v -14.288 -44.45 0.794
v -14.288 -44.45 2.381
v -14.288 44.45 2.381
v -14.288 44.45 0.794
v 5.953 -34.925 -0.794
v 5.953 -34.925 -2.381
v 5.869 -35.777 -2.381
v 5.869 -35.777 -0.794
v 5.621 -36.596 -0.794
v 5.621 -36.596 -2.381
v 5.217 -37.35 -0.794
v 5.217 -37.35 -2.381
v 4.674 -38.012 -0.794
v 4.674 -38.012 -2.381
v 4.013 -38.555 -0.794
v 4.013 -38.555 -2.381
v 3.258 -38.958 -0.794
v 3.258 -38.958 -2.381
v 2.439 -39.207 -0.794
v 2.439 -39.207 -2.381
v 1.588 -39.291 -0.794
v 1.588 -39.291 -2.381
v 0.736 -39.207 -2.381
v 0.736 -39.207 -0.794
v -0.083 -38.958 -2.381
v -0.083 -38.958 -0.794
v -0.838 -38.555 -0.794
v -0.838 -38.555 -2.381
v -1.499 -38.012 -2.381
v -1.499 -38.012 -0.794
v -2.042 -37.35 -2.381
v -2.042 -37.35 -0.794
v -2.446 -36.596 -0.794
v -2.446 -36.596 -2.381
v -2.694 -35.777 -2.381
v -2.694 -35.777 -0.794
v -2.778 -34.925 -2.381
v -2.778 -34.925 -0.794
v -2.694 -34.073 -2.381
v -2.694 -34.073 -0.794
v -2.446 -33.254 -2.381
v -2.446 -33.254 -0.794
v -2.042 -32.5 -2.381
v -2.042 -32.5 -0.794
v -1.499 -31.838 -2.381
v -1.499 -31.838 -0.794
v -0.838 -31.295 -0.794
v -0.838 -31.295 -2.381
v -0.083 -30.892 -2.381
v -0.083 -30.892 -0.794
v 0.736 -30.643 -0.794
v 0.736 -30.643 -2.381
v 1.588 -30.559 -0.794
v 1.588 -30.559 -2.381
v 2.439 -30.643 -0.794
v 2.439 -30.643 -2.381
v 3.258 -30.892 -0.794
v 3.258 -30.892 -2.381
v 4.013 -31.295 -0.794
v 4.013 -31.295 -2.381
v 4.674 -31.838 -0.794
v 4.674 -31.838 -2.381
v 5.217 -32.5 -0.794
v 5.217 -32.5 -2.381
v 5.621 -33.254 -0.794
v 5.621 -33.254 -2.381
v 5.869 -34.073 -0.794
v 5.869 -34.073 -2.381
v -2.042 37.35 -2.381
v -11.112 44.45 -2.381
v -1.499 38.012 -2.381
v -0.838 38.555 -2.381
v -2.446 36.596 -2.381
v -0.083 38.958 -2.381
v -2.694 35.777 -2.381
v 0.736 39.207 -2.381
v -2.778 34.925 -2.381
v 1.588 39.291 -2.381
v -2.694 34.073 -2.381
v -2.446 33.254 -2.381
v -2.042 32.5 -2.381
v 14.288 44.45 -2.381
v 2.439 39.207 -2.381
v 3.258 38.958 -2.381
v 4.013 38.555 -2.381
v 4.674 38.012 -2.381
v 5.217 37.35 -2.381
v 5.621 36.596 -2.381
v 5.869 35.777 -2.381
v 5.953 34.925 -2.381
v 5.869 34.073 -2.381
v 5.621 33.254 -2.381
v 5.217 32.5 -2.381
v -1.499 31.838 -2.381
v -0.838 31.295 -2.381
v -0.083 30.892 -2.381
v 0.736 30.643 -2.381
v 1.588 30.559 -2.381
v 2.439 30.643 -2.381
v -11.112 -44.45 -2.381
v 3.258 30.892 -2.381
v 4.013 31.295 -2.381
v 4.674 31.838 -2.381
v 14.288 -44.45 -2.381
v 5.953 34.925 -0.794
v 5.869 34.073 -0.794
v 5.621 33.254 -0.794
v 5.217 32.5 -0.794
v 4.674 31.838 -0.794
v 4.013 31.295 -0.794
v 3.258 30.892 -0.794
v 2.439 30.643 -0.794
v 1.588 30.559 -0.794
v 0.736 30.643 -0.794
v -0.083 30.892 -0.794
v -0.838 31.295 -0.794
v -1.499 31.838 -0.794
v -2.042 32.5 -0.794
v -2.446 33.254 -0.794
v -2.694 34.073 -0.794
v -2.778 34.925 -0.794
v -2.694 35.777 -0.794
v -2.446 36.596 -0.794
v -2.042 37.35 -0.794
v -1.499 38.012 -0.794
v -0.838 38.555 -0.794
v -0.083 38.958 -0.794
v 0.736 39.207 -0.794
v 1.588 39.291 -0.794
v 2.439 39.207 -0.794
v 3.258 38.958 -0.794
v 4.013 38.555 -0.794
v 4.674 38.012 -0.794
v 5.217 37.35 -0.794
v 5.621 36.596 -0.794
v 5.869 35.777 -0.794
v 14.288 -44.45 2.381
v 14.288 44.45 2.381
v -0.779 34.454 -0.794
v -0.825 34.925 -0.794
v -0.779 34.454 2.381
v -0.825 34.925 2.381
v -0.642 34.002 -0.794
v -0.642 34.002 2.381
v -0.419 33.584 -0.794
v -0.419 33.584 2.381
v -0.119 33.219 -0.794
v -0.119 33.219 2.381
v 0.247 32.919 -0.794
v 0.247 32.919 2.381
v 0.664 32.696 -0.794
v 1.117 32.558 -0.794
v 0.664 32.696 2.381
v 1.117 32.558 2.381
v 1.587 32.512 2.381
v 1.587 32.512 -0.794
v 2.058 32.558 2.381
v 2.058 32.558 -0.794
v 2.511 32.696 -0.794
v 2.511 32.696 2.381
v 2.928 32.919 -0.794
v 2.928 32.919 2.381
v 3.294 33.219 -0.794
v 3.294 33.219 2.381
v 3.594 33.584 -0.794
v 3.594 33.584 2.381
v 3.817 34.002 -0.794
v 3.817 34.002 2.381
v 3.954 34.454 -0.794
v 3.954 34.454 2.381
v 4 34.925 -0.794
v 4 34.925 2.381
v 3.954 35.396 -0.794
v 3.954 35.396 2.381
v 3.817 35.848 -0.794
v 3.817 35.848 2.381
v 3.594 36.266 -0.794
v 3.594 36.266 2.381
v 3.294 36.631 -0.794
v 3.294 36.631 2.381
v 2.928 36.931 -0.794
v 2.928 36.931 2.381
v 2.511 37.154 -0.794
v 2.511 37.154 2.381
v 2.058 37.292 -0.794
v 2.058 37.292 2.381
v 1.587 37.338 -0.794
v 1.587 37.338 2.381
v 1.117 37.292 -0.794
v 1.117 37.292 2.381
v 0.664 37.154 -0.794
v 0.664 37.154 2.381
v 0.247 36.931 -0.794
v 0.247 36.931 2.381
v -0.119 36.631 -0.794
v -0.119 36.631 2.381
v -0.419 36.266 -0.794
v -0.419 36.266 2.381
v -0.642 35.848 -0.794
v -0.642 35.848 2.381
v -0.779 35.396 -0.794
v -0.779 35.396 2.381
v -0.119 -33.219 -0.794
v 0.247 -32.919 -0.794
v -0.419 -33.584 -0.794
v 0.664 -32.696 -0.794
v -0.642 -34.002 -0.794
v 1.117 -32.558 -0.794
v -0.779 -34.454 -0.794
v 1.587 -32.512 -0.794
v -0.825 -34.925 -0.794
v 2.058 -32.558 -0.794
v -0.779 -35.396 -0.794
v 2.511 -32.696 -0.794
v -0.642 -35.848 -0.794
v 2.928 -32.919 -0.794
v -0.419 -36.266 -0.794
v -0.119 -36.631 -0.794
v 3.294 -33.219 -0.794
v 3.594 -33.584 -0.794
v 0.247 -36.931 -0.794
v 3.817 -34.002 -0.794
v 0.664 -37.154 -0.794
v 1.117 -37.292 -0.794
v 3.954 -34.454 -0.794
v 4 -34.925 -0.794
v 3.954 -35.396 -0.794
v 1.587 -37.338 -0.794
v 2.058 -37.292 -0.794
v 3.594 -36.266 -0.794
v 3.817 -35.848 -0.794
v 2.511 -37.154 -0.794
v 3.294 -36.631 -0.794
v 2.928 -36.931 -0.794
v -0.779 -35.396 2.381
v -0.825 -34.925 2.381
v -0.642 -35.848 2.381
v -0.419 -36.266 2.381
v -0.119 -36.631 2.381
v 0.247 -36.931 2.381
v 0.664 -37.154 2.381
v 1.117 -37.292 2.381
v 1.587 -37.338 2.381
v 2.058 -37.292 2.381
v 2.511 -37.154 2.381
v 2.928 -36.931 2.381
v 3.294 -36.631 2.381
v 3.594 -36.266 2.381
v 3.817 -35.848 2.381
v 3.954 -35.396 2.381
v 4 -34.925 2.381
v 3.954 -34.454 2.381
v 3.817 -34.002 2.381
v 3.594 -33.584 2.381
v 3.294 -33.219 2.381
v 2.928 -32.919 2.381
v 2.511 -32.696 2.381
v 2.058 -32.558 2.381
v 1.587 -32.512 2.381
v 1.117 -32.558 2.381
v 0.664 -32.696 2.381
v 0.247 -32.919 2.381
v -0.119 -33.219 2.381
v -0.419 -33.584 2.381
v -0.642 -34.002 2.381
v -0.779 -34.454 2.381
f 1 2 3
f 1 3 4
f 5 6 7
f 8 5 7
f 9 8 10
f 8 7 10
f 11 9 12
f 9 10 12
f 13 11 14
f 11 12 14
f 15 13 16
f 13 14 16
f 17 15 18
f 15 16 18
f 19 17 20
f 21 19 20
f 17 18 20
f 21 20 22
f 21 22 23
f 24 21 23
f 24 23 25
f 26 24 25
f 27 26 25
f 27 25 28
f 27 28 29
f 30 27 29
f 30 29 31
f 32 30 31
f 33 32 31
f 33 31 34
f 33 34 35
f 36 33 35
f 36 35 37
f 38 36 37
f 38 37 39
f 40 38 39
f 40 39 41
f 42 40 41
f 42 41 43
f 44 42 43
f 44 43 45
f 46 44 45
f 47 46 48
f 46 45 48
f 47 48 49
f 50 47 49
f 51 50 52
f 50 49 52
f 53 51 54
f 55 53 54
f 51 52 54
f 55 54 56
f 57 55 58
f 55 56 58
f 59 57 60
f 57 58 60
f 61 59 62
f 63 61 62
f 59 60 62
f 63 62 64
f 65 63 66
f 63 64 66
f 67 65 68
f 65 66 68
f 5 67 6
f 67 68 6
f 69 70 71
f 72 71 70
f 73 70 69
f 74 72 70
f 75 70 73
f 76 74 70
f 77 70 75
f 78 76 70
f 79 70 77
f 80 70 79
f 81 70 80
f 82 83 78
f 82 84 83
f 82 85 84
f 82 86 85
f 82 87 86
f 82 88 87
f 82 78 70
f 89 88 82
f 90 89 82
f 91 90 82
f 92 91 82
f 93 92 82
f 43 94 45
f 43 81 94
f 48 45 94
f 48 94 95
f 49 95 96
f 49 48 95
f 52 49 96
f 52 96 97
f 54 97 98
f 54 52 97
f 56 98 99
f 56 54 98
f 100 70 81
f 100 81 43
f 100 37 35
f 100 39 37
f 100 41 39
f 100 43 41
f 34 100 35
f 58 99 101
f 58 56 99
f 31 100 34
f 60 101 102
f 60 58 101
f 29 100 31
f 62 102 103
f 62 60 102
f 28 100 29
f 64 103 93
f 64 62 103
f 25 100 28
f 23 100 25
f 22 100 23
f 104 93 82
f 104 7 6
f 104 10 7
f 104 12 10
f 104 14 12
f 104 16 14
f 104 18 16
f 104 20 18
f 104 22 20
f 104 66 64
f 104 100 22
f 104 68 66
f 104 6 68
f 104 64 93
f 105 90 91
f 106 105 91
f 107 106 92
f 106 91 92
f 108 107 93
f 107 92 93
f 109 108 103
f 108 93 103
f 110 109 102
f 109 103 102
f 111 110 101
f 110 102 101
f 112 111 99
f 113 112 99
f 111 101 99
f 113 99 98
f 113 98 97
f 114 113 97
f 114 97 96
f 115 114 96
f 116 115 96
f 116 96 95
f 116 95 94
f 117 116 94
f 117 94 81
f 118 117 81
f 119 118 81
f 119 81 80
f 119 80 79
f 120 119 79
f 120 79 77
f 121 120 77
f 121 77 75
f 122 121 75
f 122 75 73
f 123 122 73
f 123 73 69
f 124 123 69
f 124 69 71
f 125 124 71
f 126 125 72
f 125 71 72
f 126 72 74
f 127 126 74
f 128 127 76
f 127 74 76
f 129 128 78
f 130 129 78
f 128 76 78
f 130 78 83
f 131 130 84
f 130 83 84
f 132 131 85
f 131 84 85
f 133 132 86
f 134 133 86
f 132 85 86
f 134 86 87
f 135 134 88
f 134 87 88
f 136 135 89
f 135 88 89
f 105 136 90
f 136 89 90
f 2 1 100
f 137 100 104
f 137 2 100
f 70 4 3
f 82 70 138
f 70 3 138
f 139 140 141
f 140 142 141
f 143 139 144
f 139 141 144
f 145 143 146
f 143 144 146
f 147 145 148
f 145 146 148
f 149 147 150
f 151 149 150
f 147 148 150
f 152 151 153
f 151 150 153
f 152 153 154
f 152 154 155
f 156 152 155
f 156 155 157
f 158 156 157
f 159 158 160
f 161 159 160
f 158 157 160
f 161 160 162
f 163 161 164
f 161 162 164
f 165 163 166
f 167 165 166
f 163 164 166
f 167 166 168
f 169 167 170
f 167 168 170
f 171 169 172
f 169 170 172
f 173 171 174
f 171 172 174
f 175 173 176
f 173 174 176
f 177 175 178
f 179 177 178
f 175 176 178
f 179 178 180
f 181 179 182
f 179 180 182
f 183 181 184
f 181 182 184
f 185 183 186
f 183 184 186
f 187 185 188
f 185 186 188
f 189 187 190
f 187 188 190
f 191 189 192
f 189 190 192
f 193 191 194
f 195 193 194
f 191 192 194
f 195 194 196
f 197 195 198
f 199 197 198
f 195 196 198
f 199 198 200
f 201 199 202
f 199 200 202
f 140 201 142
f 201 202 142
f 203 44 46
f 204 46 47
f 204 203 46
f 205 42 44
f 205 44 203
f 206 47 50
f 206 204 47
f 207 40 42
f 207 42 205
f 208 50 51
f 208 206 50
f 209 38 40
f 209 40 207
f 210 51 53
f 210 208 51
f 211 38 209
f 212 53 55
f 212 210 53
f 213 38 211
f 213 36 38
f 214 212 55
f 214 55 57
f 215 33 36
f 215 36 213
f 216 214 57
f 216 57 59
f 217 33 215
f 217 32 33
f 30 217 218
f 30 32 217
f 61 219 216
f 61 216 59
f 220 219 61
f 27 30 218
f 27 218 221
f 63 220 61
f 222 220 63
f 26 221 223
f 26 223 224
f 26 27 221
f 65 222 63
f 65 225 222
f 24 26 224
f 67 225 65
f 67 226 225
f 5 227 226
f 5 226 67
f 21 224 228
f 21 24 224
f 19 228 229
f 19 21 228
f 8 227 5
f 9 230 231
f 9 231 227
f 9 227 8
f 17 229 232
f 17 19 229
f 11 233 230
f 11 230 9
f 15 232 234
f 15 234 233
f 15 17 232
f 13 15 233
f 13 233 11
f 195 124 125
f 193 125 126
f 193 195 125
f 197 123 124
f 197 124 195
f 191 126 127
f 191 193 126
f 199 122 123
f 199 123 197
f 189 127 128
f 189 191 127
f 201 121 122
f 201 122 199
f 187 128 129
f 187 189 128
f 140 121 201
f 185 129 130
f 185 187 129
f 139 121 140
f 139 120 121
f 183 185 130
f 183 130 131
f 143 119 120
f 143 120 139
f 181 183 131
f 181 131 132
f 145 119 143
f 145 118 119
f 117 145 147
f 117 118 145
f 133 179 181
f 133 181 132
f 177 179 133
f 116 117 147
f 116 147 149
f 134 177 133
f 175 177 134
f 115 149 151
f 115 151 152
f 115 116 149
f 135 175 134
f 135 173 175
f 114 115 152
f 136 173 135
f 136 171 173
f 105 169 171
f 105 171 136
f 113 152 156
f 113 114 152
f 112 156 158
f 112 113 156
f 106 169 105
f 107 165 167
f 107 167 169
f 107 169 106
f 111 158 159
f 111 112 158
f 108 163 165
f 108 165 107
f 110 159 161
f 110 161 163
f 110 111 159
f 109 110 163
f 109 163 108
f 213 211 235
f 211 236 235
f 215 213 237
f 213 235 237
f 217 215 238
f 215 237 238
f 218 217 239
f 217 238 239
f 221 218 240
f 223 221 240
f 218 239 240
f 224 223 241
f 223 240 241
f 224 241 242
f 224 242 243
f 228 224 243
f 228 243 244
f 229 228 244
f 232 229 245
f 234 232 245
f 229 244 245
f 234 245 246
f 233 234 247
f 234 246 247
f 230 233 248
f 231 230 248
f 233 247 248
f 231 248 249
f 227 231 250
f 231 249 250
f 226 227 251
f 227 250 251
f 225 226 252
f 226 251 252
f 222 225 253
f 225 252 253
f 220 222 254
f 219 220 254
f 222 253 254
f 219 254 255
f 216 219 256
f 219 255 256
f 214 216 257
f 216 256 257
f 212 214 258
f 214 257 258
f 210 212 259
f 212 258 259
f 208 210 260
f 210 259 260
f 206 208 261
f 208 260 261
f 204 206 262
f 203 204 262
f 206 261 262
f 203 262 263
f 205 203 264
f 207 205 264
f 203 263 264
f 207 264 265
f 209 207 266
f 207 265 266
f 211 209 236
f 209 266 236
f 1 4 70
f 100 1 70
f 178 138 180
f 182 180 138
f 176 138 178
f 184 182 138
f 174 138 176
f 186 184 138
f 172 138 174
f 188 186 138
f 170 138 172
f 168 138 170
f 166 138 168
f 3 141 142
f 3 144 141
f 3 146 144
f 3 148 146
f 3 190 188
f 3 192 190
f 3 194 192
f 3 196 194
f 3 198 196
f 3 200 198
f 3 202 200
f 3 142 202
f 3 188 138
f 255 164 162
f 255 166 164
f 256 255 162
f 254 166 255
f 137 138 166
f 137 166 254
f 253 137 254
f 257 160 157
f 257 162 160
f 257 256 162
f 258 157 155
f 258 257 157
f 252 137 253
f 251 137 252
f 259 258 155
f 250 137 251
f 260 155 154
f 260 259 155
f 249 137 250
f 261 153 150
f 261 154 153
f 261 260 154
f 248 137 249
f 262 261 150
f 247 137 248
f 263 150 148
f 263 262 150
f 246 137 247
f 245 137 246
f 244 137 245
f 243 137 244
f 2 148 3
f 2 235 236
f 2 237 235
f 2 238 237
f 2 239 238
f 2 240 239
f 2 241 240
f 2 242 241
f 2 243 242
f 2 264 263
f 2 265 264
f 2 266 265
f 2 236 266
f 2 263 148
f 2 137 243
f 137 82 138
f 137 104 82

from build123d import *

# Parameters (mm, degrees)
F0_DEPTH       = 44.45
F1_D           = 4.826
F1_CBORE_D     = 8.73125
F1_CBORE_DEPTH = 1.5875


with BuildPart() as f0:
    # F2 (on Front) → F0 (new body, symmetric)
    with BuildSketch(Plane.XZ):
        Polygon((14.2875, 2.38125), (-14.2875, 2.38125), (-14.2875, 0.79375), (-11.1125, -2.38125), (14.2875, -2.38125), align=None)
    extrude(amount=F0_DEPTH, both=True)

    # F1 (through all)
    with Locations(Plane(origin=(0, 0, -2.38125), x_dir=(1, 0, 0), z_dir=(0, 0, -1))):
        with Locations((1.5875, 34.925), (1.5875, -34.925)):
            CounterBoreHole(F1_D / 2, F1_CBORE_D / 2, F1_CBORE_DEPTH)


solid = f0.part
